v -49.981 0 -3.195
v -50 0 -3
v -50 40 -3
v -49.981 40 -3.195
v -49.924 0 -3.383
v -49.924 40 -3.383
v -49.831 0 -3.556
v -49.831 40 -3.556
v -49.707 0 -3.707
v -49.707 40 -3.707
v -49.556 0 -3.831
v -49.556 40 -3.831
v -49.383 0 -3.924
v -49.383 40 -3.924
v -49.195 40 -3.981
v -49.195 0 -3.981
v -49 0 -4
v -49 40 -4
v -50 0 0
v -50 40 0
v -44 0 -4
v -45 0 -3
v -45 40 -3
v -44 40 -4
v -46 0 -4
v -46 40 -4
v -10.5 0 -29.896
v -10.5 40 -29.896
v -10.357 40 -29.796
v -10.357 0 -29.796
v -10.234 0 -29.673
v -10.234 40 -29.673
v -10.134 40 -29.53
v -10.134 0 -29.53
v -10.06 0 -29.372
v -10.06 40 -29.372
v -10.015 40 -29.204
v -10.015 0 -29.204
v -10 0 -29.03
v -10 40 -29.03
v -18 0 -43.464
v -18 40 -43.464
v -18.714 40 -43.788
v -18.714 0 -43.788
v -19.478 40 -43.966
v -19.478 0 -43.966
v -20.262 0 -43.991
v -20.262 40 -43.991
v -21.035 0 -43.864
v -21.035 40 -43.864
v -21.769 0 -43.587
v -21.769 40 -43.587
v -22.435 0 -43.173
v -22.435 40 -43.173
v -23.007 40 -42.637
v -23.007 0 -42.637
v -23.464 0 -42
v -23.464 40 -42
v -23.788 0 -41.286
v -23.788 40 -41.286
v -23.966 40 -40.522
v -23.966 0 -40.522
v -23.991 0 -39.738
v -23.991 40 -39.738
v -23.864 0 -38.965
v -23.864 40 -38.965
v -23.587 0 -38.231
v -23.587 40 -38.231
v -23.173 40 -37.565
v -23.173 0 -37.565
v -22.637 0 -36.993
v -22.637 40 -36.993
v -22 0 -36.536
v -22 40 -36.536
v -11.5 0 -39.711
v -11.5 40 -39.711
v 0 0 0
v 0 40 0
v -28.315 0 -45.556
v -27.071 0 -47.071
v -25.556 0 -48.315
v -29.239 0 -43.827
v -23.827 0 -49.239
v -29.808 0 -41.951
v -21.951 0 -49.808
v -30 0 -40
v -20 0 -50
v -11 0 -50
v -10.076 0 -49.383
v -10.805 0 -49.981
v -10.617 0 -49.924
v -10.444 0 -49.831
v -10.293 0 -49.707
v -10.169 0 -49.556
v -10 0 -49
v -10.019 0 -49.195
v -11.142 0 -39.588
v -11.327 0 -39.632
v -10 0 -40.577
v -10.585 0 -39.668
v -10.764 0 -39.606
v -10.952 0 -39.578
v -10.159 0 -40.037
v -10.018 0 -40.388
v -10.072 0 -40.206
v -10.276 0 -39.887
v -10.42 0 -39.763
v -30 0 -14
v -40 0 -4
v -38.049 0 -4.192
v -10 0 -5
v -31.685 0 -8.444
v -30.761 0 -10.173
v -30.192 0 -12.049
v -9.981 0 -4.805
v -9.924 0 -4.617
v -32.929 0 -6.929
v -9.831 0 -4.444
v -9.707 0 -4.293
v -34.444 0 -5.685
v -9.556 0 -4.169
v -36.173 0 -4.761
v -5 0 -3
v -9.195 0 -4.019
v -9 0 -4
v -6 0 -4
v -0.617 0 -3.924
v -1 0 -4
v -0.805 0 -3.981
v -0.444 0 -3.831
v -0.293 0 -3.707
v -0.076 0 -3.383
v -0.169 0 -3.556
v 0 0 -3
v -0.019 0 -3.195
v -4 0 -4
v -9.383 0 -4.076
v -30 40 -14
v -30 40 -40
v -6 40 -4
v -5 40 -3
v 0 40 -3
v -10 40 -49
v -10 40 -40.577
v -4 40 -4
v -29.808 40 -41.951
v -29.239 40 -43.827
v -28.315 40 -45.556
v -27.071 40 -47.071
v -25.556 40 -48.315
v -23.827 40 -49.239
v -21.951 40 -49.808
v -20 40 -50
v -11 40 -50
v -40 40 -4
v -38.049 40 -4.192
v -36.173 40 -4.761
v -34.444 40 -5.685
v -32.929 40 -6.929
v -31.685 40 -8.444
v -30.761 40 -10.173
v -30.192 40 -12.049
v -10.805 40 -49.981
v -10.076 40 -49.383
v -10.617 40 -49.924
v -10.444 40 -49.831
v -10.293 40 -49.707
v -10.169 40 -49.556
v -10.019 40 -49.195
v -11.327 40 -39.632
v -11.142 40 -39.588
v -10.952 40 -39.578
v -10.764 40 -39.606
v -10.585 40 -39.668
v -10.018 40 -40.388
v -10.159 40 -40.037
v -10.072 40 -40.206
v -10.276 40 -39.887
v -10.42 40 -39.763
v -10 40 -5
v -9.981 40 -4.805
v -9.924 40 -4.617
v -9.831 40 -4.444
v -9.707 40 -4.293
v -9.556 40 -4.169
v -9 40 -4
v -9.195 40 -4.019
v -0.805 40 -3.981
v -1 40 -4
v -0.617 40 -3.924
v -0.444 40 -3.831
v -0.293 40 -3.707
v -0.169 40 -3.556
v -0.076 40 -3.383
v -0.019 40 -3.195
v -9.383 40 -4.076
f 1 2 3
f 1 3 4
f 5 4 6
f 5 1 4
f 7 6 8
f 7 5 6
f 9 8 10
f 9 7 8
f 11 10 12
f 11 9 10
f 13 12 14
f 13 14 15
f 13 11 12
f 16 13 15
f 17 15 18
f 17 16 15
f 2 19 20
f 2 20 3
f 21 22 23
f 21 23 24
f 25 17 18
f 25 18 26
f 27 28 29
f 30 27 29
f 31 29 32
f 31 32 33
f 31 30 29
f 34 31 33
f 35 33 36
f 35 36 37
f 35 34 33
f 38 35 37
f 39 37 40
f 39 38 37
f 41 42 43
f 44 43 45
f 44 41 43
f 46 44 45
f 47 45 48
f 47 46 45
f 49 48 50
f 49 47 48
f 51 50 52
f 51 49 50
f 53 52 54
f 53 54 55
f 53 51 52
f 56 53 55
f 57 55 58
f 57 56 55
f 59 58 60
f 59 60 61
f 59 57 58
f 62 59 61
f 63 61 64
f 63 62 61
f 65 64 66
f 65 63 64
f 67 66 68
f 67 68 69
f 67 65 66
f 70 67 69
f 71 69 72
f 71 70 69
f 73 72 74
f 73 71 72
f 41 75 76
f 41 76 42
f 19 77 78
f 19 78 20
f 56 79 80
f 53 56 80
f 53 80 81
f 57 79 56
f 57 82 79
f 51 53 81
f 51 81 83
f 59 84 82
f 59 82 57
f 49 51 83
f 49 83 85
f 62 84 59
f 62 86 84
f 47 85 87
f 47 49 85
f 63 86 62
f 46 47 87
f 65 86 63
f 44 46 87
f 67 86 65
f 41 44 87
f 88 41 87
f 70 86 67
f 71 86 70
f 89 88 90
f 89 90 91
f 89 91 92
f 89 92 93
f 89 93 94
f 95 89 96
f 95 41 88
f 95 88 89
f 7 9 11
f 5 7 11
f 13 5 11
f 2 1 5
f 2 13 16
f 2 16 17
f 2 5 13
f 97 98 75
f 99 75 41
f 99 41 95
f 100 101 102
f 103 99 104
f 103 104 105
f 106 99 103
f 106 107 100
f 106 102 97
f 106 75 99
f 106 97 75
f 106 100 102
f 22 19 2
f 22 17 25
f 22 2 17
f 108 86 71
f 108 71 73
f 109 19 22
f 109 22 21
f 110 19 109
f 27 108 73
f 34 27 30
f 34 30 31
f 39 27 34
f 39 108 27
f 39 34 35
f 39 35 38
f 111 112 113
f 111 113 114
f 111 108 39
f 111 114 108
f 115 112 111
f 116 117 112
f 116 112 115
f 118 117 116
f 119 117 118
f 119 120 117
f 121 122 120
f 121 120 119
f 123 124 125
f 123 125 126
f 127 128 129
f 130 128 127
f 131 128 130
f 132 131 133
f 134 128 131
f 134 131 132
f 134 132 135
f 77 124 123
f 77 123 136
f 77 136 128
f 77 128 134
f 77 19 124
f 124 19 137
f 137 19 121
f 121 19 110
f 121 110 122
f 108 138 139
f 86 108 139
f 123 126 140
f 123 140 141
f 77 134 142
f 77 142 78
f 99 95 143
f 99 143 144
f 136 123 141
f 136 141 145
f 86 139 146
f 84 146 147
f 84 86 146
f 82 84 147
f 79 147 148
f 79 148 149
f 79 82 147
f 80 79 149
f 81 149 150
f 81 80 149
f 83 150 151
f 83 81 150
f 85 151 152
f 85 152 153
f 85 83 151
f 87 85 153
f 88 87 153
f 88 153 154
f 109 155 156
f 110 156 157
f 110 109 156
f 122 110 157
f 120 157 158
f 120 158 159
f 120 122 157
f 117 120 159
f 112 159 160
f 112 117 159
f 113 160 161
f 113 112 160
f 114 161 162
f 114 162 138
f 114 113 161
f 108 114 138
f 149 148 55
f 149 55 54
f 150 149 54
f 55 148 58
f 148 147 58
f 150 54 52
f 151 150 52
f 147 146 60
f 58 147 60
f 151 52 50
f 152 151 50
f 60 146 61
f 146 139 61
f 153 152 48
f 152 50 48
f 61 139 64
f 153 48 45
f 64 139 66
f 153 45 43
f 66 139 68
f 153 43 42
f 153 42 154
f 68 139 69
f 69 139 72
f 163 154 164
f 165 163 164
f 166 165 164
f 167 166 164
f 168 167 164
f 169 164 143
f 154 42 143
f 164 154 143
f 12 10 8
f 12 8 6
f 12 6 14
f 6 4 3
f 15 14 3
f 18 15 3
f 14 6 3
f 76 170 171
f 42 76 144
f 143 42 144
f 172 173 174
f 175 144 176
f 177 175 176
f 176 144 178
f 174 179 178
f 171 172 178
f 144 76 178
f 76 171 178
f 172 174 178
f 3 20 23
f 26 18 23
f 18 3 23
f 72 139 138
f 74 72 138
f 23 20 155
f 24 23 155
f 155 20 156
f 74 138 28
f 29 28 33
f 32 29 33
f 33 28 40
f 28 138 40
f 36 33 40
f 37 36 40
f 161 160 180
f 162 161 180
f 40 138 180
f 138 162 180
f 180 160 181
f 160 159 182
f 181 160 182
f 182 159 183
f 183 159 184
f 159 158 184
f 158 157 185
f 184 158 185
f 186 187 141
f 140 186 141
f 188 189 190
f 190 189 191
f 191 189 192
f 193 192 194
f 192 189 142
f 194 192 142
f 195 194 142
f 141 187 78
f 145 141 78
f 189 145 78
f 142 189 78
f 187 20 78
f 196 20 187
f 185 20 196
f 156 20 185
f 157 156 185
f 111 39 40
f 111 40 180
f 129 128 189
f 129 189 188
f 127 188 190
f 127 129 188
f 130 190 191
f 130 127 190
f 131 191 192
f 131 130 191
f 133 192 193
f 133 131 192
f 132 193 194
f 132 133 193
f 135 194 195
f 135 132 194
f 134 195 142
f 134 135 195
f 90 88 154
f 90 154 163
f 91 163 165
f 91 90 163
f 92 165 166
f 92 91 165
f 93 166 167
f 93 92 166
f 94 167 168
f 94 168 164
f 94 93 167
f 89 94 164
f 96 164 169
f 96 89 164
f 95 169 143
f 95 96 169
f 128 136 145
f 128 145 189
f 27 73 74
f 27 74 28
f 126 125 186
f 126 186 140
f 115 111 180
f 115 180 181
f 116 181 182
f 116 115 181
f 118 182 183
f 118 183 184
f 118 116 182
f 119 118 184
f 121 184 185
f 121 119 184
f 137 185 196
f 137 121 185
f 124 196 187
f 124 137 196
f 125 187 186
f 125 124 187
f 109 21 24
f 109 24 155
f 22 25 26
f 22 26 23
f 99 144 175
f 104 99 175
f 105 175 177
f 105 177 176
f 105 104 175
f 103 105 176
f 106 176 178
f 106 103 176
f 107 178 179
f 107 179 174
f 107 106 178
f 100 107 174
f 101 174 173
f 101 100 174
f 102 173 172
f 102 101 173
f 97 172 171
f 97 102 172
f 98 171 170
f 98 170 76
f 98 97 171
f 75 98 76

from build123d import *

# Parameters (mm, degrees)
F1_DEPTH = 40


with BuildPart() as f1:
    # F0 (on Front) → F1 (new body)
    with BuildSketch(Plane.XZ):
        with BuildLine():
            Line((0, 0), (-50, 0))
            Line((-50, 0), (-50, -3))
            ThreePointArc((-50, -3), (-49.707107, -3.707107), (-49, -4))
            Line((-49, -4), (-46, -4))
            Line((-46, -4), (-45, -3))
            Line((-45, -3), (-44, -4))
            Line((-44, -4), (-40, -4))
            ThreePointArc((-40, -4), (-32.928932, -6.928932), (-30, -14))
            Line((-30, -14), (-30, -40))
            ThreePointArc((-30, -40), (-27.071068, -47.071068), (-20, -50))
            Line((-20, -50), (-11, -50))
            ThreePointArc((-11, -50), (-10.292893, -49.707107), (-10, -49))
            Line((-10, -49), (-10, -40.57735))
            ThreePointArc((-10, -40.57735), (-10.5, -39.711325), (-11.5, -39.711325))
            Line((-11.5, -39.711325), (-18, -43.464102))
            ThreePointArc((-18, -43.464102), (-23.464102, -42), (-22, -36.535898))
            Line((-22, -36.535898), (-10.5, -29.89637))
            ThreePointArc((-10.5, -29.89637), (-10.133975, -29.530345), (-10, -29.030345))
            Line((-10, -29.030345), (-10, -5))
            ThreePointArc((-10, -5), (-9.707107, -4.292893), (-9, -4))
            Line((-9, -4), (-6, -4))
            Line((-6, -4), (-5, -3))
            Line((-5, -3), (-4, -4))
            Line((-4, -4), (-1, -4))
            ThreePointArc((-1, -4), (-0.292893, -3.707107), (0, -3))
            Line((0, -3), (0, 0))
        make_face()
    extrude(amount=-F1_DEPTH)


solid = f1.part
